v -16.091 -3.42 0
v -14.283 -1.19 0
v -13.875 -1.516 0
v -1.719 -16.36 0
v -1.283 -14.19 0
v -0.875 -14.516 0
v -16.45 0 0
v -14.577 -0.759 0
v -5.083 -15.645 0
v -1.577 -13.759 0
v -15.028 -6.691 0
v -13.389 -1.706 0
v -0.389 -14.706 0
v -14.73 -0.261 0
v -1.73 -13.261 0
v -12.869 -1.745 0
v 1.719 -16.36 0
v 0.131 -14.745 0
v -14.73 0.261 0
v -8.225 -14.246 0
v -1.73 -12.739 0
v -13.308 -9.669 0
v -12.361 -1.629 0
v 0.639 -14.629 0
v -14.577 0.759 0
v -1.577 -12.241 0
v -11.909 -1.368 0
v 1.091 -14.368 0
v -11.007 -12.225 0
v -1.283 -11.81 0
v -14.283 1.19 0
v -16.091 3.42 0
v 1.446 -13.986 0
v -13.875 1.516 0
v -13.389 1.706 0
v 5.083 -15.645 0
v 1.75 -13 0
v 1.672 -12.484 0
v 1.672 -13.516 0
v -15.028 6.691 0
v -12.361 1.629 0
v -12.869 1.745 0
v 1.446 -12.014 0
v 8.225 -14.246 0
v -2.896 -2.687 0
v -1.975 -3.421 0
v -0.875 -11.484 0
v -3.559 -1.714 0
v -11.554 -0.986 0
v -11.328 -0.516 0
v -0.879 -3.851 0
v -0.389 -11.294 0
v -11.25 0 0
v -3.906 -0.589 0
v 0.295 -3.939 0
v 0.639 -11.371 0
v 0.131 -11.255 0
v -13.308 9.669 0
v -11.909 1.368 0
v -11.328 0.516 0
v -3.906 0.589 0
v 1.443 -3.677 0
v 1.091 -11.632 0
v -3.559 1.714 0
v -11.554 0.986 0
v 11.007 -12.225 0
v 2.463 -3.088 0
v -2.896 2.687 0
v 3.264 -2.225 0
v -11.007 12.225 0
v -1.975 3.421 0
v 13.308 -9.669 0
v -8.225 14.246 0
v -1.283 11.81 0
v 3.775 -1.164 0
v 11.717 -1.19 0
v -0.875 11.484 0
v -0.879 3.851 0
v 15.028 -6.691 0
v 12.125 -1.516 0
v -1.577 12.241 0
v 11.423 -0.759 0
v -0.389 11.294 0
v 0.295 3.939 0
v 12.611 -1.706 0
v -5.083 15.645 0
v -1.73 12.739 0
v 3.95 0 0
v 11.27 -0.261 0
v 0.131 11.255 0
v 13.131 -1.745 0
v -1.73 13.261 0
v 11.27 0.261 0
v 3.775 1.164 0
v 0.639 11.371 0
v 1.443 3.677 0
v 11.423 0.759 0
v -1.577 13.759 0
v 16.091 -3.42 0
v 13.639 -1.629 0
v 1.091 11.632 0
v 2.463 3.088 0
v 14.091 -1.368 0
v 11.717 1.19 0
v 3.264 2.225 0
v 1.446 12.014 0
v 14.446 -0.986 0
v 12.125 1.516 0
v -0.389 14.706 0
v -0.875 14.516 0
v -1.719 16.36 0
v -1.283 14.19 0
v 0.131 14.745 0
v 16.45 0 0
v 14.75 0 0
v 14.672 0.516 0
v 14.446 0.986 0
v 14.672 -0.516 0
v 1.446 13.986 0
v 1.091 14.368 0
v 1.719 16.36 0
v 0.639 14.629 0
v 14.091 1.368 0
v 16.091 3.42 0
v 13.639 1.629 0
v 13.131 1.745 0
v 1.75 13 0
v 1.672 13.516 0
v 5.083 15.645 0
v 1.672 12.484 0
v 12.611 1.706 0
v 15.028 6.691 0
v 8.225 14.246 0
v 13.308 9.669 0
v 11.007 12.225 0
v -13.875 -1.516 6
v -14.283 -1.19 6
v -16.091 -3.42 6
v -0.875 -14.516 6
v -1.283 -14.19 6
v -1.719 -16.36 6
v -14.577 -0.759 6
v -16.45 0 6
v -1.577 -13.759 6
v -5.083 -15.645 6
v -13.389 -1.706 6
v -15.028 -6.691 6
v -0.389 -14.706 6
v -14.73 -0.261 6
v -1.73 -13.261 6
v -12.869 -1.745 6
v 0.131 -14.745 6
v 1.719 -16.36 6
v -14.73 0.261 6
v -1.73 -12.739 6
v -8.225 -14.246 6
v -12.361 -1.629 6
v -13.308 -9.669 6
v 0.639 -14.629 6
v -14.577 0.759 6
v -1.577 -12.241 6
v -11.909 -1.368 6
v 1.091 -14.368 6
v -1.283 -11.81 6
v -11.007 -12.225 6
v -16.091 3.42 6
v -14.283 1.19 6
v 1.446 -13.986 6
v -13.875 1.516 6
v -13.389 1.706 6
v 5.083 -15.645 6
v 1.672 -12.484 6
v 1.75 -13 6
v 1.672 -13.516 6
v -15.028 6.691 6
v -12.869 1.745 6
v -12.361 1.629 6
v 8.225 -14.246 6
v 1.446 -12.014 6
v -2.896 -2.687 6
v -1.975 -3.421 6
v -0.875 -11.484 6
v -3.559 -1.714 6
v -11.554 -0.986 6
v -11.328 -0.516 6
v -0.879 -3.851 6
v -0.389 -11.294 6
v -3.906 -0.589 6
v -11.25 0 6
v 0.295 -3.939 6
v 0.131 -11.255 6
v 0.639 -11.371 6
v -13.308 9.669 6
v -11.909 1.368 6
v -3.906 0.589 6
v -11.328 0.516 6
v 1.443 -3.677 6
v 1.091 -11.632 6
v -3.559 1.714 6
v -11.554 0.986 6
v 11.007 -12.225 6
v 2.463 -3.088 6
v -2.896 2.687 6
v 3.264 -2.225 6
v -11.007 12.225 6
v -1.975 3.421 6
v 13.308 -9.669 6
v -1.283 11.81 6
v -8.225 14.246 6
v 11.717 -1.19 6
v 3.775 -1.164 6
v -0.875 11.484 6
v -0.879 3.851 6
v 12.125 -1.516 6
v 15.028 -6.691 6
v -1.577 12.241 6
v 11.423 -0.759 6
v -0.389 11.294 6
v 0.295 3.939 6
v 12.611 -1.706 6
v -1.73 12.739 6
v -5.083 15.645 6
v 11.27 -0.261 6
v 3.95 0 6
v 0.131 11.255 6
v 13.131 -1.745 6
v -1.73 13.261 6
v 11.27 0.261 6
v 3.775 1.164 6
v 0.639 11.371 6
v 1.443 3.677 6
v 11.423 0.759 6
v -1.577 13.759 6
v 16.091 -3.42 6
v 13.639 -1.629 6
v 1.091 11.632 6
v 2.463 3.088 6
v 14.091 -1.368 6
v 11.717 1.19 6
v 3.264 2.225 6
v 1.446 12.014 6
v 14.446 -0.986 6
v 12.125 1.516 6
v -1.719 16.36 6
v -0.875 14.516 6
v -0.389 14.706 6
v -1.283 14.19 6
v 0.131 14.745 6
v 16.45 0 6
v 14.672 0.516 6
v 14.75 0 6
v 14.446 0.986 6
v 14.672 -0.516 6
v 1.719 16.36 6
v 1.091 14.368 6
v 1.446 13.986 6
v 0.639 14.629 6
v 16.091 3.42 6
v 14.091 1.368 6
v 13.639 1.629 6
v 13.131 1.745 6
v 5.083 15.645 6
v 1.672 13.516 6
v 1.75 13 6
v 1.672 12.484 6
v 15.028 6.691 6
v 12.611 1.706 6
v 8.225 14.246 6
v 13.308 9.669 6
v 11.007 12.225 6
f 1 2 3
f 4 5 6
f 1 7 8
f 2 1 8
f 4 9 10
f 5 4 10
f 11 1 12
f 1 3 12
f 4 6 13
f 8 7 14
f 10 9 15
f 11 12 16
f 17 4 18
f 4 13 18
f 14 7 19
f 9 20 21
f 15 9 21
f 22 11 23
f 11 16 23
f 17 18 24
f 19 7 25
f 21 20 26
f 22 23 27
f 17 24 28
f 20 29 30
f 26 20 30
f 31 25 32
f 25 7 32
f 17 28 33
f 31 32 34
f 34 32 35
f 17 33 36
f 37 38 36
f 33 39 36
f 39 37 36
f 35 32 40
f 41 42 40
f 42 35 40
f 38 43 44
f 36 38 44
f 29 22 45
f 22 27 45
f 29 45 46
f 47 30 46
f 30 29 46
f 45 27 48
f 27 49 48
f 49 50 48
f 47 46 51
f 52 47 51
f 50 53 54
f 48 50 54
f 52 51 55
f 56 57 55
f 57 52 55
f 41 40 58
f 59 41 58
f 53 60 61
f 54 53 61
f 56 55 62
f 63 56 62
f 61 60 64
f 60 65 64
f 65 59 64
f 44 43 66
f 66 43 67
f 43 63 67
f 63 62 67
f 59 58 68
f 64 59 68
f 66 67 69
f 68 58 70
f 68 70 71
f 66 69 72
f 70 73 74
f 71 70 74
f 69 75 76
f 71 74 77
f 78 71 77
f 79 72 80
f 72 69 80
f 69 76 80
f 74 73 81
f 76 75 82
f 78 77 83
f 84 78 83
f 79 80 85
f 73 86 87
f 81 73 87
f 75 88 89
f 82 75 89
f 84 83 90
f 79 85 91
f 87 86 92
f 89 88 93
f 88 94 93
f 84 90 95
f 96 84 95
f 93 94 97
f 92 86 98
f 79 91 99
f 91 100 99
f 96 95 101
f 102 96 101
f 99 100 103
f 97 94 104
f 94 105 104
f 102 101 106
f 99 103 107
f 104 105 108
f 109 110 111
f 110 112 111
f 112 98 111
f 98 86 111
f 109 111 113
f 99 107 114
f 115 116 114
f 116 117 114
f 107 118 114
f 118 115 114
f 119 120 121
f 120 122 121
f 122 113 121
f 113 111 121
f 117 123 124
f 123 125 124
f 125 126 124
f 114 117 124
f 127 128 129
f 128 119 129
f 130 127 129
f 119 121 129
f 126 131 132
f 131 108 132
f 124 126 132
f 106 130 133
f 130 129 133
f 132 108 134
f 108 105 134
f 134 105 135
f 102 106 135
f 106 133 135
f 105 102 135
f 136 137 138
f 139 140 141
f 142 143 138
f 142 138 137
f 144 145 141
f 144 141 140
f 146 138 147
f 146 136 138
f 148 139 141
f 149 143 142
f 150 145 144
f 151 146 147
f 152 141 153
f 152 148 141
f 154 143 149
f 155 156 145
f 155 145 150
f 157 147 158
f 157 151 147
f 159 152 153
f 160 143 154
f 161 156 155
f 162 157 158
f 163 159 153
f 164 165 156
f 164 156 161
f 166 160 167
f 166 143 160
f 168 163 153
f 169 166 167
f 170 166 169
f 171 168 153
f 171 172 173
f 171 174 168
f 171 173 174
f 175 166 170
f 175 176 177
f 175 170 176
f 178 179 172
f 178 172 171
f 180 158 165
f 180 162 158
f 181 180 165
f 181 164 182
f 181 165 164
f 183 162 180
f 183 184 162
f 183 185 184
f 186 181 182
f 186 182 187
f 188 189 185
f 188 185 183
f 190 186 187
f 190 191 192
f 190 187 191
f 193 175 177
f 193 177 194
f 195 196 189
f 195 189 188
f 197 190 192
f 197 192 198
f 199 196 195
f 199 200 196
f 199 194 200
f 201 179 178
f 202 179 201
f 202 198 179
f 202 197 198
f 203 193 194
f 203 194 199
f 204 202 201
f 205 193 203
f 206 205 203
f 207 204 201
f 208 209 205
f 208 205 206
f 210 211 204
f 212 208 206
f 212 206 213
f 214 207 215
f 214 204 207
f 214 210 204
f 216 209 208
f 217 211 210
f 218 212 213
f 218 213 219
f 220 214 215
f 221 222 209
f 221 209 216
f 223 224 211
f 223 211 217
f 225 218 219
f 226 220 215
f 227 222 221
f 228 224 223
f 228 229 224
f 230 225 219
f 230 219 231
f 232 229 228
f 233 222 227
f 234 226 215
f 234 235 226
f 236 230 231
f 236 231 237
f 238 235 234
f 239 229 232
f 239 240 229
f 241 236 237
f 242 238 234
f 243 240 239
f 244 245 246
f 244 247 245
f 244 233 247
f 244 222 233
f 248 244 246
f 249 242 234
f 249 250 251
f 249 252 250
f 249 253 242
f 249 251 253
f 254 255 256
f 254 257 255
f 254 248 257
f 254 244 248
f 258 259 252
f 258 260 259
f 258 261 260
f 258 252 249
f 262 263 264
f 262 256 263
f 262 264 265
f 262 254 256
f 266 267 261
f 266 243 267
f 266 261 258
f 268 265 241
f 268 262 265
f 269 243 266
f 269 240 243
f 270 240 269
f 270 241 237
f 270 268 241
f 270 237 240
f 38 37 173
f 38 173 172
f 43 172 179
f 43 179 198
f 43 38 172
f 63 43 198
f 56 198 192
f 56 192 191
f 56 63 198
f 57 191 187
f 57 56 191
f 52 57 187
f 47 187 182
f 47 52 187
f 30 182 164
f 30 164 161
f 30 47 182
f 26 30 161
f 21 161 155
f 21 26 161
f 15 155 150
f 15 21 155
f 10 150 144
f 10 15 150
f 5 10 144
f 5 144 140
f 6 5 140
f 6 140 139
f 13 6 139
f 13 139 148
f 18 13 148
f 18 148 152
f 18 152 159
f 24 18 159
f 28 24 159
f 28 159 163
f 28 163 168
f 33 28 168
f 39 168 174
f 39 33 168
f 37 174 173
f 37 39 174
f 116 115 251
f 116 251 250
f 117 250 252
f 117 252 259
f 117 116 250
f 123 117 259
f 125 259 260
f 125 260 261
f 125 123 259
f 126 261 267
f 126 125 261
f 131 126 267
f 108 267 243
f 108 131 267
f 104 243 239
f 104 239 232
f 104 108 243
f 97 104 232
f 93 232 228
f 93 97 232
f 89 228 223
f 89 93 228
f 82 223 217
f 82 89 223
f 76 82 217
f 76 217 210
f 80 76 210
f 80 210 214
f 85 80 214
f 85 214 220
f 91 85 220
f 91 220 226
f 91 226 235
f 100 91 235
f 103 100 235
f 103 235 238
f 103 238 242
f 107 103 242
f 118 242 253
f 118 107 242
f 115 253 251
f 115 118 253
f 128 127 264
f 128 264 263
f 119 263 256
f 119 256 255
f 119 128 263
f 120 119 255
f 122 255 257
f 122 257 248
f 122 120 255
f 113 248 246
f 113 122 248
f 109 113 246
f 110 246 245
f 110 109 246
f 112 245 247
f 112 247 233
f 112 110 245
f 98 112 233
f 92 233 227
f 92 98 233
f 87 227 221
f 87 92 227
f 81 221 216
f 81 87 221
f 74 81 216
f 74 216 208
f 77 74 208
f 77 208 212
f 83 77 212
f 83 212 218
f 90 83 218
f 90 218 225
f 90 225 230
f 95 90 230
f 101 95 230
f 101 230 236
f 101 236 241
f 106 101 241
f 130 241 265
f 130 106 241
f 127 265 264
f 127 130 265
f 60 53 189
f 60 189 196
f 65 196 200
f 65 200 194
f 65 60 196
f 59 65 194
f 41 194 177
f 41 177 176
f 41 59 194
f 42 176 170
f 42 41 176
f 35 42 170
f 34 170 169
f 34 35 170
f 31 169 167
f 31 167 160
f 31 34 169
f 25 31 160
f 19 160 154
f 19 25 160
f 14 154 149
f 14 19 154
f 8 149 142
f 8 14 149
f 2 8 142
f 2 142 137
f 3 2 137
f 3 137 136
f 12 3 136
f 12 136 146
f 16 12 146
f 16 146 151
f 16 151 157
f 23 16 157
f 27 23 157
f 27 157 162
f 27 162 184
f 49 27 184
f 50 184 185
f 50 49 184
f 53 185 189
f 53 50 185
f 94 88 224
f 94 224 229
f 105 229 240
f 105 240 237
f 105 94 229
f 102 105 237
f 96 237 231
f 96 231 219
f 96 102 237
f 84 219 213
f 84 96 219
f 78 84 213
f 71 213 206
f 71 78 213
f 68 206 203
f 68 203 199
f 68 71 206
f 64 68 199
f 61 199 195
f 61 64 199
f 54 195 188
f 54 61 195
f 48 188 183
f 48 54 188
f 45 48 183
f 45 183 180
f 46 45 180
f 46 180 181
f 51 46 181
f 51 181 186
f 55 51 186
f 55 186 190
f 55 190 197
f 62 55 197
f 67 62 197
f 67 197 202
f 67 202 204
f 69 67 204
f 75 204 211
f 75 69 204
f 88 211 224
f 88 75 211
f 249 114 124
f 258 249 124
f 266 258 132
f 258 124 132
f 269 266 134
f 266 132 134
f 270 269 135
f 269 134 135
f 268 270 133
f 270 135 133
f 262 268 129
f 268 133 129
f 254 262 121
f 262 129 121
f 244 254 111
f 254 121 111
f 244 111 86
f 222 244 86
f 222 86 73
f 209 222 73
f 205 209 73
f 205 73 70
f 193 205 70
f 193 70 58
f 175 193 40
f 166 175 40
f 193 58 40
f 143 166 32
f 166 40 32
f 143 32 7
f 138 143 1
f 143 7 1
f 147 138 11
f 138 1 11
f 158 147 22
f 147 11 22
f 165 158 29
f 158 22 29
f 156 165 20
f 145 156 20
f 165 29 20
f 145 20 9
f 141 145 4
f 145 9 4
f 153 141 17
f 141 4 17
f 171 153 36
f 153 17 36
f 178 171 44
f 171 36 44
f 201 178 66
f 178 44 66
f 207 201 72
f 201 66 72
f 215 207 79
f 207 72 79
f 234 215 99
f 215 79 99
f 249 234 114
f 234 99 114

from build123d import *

# Parameters (mm, degrees)
SKETCH1_R           = 16.4
SKETCH1_R_2         = 4
SKETCH1_R_3         = 1.8
BOSS_EXTRUDE1_DEPTH = 6
MOVE_FACE1_BY       = 0.05
MOVE_FACE1_2_BY     = 0.05
MOVE_FACE1_3_BY     = 0.05
MOVE_FACE1_4_BY     = 0.05
MOVE_FACE1_5_BY     = 0.05
MOVE_FACE1_6_BY     = 0.05


with BuildPart() as part:
    # Sketch1 → Boss-Extrude1 (new body)
    with BuildSketch(Plane.XY):
        Circle(SKETCH1_R)
        Circle(SKETCH1_R_2, mode=Mode.SUBTRACT)
        with Locations((0, 13)):
            Circle(SKETCH1_R_3, mode=Mode.SUBTRACT)
        with Locations((13, 0)):
            Circle(SKETCH1_R_3, mode=Mode.SUBTRACT)
        with Locations((0, -13)):
            Circle(SKETCH1_R_3, mode=Mode.SUBTRACT)
        with Locations((-13, 0)):
            Circle(SKETCH1_R_3, mode=Mode.SUBTRACT)
    extrude(amount=BOSS_EXTRUDE1_DEPTH)

    # Move Face1: a curved face moved outward by 0.05
    add(Solid.thicken(part.faces().sort_by_distance((-1.8, 13, 3))[0], MOVE_FACE1_BY))

    # Move Face1 2: a curved face moved outward by 0.05
    add(Solid.thicken(part.faces().sort_by_distance((-16.4, 0, 3))[0], MOVE_FACE1_2_BY))

    # Move Face1 3: a curved face moved outward by 0.05
    add(Solid.thicken(part.faces().sort_by_distance((-4, 0, 3))[0], MOVE_FACE1_3_BY))

    # Move Face1 4: a curved face moved outward by 0.05
    add(Solid.thicken(part.faces().sort_by_distance((11.2, 0, 3))[0], MOVE_FACE1_4_BY))

    # Move Face1 5: a curved face moved outward by 0.05
    add(Solid.thicken(part.faces().sort_by_distance((-1.8, -13, 3))[0], MOVE_FACE1_5_BY))

    # Move Face1 6: a curved face moved outward by 0.05
    add(Solid.thicken(part.faces().sort_by_distance((-14.8, 0, 3))[0], MOVE_FACE1_6_BY))


solid = part.part
